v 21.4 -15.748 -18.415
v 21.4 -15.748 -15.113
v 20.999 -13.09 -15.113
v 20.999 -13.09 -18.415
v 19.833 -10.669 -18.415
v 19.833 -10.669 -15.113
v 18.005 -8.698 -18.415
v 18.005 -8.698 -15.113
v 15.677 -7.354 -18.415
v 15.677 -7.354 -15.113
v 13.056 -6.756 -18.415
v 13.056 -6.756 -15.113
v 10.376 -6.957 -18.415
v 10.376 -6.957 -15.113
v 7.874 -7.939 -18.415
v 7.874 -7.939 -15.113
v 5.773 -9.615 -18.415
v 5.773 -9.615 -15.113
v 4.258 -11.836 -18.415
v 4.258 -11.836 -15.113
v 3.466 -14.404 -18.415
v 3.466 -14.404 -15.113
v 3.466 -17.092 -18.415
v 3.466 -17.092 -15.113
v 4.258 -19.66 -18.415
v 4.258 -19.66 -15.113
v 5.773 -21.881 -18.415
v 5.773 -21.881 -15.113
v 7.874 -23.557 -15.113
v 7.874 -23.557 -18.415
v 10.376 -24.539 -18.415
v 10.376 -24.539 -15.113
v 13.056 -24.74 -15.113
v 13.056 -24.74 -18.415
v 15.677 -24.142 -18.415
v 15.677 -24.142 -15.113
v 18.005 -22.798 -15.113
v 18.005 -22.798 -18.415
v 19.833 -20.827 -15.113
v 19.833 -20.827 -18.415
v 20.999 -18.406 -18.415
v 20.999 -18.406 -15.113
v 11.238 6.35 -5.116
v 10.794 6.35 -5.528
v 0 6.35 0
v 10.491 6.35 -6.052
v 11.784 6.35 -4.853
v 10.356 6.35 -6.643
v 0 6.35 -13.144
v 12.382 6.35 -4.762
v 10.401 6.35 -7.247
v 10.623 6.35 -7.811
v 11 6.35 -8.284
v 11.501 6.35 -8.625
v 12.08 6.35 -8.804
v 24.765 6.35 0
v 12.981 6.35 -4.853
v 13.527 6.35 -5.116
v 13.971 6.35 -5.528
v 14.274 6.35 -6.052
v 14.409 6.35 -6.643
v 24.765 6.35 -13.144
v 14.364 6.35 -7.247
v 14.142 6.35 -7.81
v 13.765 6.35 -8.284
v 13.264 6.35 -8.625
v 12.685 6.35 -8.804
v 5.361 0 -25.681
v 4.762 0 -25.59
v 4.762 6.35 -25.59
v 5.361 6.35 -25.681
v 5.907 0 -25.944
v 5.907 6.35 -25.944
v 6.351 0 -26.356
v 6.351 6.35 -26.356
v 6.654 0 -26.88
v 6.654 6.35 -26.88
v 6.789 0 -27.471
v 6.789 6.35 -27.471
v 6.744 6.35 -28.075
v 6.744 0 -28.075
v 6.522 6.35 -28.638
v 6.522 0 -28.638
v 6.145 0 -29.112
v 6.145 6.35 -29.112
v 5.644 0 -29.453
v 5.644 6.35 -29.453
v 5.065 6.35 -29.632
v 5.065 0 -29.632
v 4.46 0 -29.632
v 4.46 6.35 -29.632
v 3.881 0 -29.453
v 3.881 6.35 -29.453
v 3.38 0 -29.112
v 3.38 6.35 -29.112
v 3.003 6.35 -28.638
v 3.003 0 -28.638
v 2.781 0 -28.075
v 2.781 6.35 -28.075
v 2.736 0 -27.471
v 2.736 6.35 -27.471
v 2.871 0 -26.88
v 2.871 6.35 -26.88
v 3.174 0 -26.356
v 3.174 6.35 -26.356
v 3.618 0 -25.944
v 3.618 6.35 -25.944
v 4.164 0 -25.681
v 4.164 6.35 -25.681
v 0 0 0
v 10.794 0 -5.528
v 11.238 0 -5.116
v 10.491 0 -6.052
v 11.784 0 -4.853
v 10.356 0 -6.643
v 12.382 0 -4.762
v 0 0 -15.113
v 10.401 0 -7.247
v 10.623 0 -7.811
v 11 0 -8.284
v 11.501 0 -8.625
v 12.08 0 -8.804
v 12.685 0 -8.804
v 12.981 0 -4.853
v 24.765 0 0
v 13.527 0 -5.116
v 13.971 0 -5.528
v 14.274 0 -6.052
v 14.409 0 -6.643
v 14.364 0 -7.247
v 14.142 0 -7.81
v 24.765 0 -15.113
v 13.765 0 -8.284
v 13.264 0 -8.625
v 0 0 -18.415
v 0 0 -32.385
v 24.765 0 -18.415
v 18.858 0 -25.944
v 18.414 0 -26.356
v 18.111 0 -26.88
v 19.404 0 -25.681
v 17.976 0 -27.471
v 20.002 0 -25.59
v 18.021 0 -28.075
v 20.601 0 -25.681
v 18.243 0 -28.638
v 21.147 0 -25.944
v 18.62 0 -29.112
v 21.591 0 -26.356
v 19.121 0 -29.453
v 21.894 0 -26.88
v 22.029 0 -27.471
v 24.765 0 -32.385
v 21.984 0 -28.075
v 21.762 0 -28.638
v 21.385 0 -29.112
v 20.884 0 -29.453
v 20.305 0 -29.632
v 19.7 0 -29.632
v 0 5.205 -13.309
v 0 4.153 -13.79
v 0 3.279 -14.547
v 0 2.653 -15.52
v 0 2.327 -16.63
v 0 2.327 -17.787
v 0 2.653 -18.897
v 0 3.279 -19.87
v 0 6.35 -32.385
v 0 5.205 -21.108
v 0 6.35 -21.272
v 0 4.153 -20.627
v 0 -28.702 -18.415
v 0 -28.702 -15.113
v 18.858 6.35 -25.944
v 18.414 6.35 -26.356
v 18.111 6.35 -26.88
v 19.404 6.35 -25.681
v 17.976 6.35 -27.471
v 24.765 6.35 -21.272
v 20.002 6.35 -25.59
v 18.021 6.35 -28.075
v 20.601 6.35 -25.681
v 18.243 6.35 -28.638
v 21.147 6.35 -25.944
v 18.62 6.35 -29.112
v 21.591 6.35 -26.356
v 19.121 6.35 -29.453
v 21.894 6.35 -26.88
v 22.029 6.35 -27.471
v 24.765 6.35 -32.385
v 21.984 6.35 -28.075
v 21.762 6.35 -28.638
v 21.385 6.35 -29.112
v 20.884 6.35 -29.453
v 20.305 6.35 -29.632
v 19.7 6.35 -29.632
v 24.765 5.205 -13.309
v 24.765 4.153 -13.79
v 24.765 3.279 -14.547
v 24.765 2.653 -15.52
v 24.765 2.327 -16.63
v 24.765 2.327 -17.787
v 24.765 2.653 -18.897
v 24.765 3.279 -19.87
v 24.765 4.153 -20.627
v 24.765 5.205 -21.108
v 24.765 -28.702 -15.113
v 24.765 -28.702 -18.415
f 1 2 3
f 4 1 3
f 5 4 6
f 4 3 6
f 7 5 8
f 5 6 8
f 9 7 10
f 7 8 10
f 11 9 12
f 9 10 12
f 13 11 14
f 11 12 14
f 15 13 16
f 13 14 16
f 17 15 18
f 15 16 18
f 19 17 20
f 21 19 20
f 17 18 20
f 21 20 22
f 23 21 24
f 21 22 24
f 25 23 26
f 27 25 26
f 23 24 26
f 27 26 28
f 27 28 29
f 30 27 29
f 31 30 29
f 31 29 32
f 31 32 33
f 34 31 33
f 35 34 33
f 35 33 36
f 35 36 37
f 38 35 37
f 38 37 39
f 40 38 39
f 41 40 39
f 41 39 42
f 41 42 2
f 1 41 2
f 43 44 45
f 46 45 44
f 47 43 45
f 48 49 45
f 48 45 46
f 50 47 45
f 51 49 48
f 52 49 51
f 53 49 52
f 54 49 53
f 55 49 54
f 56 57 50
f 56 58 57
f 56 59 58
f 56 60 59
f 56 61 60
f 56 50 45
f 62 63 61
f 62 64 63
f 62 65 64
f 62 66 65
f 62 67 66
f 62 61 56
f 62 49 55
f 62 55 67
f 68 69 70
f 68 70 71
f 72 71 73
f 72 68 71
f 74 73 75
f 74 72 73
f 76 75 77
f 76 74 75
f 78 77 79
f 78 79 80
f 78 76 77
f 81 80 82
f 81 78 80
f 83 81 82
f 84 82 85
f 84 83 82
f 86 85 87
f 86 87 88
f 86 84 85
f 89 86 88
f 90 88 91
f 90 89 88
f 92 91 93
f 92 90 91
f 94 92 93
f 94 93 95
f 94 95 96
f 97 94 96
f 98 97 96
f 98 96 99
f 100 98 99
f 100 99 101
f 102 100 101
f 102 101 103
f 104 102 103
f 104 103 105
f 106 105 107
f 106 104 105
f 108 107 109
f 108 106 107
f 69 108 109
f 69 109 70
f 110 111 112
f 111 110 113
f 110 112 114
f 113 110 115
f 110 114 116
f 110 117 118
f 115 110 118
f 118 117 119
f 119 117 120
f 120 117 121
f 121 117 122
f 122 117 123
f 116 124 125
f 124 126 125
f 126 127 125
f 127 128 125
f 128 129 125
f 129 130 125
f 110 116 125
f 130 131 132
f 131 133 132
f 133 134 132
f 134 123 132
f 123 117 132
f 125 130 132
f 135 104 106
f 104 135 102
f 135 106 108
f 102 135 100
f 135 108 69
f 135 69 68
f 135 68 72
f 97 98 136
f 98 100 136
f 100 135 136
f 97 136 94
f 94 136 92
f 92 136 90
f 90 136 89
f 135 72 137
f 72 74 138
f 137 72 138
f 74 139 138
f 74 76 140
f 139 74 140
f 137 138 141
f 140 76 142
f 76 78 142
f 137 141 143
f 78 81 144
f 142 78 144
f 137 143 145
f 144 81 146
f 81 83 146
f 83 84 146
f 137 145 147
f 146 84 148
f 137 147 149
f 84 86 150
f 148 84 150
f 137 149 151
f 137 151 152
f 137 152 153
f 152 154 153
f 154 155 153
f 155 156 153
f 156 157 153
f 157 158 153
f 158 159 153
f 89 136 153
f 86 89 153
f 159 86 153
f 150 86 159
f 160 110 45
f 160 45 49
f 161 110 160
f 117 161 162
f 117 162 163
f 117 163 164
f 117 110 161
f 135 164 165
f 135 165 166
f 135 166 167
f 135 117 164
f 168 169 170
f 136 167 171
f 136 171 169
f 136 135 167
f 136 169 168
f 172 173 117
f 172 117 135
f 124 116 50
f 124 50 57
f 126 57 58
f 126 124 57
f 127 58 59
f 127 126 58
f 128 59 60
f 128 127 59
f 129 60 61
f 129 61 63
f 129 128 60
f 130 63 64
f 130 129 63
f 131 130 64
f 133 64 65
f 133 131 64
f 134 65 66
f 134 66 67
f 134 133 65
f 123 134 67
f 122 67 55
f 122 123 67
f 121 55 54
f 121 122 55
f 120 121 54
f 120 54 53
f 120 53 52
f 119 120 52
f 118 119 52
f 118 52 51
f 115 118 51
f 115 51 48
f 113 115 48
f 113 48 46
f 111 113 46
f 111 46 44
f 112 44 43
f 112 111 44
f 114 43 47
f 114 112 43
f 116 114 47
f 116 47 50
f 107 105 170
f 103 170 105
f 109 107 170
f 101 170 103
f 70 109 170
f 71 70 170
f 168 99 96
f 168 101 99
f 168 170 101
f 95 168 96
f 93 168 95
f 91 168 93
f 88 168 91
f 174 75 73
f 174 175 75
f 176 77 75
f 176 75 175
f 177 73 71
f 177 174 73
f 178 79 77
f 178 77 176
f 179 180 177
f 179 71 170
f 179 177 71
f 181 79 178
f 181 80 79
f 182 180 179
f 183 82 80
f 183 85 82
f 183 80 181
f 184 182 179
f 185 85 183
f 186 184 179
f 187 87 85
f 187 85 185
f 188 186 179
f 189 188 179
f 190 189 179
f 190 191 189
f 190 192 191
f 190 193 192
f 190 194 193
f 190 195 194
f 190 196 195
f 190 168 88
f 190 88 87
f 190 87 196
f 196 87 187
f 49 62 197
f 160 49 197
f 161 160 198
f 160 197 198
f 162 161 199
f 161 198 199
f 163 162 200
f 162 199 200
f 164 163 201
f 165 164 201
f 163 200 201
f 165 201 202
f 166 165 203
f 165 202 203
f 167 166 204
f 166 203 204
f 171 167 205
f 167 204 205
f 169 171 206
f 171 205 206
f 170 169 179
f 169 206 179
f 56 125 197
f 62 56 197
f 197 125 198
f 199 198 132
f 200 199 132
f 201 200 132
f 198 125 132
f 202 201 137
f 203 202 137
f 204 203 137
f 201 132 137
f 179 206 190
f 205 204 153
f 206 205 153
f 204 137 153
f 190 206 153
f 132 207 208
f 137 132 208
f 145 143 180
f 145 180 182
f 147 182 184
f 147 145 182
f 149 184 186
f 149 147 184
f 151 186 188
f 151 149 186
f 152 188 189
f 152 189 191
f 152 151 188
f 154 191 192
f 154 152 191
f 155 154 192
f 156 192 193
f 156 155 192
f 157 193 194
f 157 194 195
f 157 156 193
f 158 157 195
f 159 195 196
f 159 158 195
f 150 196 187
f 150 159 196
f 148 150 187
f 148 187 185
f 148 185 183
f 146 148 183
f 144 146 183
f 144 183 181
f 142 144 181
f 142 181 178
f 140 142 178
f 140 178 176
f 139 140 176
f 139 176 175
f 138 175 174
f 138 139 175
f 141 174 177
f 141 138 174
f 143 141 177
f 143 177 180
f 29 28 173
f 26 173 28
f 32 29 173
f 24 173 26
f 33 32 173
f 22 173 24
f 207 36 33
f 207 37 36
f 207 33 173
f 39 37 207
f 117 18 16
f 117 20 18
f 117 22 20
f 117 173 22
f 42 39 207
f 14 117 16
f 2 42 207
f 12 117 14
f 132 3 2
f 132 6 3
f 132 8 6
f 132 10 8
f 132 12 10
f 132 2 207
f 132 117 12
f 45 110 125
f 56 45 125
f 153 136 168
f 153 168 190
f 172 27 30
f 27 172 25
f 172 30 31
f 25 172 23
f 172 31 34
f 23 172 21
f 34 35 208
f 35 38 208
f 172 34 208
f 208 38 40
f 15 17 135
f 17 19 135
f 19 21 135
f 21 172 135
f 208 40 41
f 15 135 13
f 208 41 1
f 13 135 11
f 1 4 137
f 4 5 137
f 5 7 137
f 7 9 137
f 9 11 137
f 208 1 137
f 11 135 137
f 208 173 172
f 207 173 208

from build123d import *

# Parameters (mm, degrees)
SKETCH11_W          = 24.765
SKETCH11_H          = 32.385
SKETCH11_R          = 2.032
BOSS_EXTRUDE1_DEPTH = 6.35
SKETCH12_W          = 24.765
SKETCH12_H          = 4.064
SKETCH14_W          = 24.765
SKETCH14_H          = 3.302
BOSS_EXTRUDE2_DEPTH = 28.702
CUT_EXTRUDE1_REACH  = 43.659
SKETCH15_R          = 9.017


with BuildPart() as part:
    # Sketch11 → Boss-Extrude1 (new body)
    with BuildSketch(Plane(origin=(0, 0, 0), x_dir=(1, 0, 0), z_dir=(0, 1, 0))):
        with Locations((12.3825, 16.1925)):
            Rectangle(SKETCH11_W, SKETCH11_H)
        with Locations(Location((4.7625, 27.6225, 0), (0, 0, 270))):
            Circle(SKETCH11_R, mode=Mode.SUBTRACT)
        with Locations(Location((20.0025, 27.6225, 0), (0, 0, 270))):
            Circle(SKETCH11_R, mode=Mode.SUBTRACT)
        with Locations(Location((12.3825, 6.7945, 0), (0, 0, 270))):
            Circle(SKETCH11_R, mode=Mode.SUBTRACT)
    extrude(amount=BOSS_EXTRUDE1_DEPTH)

    # Sketch12 → Cut-Revolve1 (revolve, cut)
    with BuildSketch(Plane(origin=(0, 6.35, 0), x_dir=(1, 0, 0), z_dir=(0, 1, 0))):
        with Locations((12.3825, 15.1765)):
            Rectangle(SKETCH12_W, SKETCH12_H)
    revolve(axis=Axis((0, 6.35, -17.2085), (1, 0, 0)), mode=Mode.SUBTRACT)

    # Sketch14 → Boss-Extrude2 (add)
    with BuildSketch(Plane.XZ):
        with Locations((12.3825, -16.764)):
            Rectangle(SKETCH14_W, SKETCH14_H)
    extrude(amount=BOSS_EXTRUDE2_DEPTH)

    # Sketch15 → Cut-Extrude1 (cut, up to next)
    with BuildSketch(Plane.XY.offset(-15.113), mode=Mode.PRIVATE) as cut_extrude1_sk1:
        with Locations((12.3825, -15.748)):
            Circle(SKETCH15_R)
    cut_extrude1_tool1 = extrude(cut_extrude1_sk1.sketch, amount=-CUT_EXTRUDE1_REACH, mode=Mode.PRIVATE) & part.part
    add(cut_extrude1_tool1.solids().sort_by_distance((12.3825, -15.748, -15.113))[0], mode=Mode.SUBTRACT)


solid = part.part
